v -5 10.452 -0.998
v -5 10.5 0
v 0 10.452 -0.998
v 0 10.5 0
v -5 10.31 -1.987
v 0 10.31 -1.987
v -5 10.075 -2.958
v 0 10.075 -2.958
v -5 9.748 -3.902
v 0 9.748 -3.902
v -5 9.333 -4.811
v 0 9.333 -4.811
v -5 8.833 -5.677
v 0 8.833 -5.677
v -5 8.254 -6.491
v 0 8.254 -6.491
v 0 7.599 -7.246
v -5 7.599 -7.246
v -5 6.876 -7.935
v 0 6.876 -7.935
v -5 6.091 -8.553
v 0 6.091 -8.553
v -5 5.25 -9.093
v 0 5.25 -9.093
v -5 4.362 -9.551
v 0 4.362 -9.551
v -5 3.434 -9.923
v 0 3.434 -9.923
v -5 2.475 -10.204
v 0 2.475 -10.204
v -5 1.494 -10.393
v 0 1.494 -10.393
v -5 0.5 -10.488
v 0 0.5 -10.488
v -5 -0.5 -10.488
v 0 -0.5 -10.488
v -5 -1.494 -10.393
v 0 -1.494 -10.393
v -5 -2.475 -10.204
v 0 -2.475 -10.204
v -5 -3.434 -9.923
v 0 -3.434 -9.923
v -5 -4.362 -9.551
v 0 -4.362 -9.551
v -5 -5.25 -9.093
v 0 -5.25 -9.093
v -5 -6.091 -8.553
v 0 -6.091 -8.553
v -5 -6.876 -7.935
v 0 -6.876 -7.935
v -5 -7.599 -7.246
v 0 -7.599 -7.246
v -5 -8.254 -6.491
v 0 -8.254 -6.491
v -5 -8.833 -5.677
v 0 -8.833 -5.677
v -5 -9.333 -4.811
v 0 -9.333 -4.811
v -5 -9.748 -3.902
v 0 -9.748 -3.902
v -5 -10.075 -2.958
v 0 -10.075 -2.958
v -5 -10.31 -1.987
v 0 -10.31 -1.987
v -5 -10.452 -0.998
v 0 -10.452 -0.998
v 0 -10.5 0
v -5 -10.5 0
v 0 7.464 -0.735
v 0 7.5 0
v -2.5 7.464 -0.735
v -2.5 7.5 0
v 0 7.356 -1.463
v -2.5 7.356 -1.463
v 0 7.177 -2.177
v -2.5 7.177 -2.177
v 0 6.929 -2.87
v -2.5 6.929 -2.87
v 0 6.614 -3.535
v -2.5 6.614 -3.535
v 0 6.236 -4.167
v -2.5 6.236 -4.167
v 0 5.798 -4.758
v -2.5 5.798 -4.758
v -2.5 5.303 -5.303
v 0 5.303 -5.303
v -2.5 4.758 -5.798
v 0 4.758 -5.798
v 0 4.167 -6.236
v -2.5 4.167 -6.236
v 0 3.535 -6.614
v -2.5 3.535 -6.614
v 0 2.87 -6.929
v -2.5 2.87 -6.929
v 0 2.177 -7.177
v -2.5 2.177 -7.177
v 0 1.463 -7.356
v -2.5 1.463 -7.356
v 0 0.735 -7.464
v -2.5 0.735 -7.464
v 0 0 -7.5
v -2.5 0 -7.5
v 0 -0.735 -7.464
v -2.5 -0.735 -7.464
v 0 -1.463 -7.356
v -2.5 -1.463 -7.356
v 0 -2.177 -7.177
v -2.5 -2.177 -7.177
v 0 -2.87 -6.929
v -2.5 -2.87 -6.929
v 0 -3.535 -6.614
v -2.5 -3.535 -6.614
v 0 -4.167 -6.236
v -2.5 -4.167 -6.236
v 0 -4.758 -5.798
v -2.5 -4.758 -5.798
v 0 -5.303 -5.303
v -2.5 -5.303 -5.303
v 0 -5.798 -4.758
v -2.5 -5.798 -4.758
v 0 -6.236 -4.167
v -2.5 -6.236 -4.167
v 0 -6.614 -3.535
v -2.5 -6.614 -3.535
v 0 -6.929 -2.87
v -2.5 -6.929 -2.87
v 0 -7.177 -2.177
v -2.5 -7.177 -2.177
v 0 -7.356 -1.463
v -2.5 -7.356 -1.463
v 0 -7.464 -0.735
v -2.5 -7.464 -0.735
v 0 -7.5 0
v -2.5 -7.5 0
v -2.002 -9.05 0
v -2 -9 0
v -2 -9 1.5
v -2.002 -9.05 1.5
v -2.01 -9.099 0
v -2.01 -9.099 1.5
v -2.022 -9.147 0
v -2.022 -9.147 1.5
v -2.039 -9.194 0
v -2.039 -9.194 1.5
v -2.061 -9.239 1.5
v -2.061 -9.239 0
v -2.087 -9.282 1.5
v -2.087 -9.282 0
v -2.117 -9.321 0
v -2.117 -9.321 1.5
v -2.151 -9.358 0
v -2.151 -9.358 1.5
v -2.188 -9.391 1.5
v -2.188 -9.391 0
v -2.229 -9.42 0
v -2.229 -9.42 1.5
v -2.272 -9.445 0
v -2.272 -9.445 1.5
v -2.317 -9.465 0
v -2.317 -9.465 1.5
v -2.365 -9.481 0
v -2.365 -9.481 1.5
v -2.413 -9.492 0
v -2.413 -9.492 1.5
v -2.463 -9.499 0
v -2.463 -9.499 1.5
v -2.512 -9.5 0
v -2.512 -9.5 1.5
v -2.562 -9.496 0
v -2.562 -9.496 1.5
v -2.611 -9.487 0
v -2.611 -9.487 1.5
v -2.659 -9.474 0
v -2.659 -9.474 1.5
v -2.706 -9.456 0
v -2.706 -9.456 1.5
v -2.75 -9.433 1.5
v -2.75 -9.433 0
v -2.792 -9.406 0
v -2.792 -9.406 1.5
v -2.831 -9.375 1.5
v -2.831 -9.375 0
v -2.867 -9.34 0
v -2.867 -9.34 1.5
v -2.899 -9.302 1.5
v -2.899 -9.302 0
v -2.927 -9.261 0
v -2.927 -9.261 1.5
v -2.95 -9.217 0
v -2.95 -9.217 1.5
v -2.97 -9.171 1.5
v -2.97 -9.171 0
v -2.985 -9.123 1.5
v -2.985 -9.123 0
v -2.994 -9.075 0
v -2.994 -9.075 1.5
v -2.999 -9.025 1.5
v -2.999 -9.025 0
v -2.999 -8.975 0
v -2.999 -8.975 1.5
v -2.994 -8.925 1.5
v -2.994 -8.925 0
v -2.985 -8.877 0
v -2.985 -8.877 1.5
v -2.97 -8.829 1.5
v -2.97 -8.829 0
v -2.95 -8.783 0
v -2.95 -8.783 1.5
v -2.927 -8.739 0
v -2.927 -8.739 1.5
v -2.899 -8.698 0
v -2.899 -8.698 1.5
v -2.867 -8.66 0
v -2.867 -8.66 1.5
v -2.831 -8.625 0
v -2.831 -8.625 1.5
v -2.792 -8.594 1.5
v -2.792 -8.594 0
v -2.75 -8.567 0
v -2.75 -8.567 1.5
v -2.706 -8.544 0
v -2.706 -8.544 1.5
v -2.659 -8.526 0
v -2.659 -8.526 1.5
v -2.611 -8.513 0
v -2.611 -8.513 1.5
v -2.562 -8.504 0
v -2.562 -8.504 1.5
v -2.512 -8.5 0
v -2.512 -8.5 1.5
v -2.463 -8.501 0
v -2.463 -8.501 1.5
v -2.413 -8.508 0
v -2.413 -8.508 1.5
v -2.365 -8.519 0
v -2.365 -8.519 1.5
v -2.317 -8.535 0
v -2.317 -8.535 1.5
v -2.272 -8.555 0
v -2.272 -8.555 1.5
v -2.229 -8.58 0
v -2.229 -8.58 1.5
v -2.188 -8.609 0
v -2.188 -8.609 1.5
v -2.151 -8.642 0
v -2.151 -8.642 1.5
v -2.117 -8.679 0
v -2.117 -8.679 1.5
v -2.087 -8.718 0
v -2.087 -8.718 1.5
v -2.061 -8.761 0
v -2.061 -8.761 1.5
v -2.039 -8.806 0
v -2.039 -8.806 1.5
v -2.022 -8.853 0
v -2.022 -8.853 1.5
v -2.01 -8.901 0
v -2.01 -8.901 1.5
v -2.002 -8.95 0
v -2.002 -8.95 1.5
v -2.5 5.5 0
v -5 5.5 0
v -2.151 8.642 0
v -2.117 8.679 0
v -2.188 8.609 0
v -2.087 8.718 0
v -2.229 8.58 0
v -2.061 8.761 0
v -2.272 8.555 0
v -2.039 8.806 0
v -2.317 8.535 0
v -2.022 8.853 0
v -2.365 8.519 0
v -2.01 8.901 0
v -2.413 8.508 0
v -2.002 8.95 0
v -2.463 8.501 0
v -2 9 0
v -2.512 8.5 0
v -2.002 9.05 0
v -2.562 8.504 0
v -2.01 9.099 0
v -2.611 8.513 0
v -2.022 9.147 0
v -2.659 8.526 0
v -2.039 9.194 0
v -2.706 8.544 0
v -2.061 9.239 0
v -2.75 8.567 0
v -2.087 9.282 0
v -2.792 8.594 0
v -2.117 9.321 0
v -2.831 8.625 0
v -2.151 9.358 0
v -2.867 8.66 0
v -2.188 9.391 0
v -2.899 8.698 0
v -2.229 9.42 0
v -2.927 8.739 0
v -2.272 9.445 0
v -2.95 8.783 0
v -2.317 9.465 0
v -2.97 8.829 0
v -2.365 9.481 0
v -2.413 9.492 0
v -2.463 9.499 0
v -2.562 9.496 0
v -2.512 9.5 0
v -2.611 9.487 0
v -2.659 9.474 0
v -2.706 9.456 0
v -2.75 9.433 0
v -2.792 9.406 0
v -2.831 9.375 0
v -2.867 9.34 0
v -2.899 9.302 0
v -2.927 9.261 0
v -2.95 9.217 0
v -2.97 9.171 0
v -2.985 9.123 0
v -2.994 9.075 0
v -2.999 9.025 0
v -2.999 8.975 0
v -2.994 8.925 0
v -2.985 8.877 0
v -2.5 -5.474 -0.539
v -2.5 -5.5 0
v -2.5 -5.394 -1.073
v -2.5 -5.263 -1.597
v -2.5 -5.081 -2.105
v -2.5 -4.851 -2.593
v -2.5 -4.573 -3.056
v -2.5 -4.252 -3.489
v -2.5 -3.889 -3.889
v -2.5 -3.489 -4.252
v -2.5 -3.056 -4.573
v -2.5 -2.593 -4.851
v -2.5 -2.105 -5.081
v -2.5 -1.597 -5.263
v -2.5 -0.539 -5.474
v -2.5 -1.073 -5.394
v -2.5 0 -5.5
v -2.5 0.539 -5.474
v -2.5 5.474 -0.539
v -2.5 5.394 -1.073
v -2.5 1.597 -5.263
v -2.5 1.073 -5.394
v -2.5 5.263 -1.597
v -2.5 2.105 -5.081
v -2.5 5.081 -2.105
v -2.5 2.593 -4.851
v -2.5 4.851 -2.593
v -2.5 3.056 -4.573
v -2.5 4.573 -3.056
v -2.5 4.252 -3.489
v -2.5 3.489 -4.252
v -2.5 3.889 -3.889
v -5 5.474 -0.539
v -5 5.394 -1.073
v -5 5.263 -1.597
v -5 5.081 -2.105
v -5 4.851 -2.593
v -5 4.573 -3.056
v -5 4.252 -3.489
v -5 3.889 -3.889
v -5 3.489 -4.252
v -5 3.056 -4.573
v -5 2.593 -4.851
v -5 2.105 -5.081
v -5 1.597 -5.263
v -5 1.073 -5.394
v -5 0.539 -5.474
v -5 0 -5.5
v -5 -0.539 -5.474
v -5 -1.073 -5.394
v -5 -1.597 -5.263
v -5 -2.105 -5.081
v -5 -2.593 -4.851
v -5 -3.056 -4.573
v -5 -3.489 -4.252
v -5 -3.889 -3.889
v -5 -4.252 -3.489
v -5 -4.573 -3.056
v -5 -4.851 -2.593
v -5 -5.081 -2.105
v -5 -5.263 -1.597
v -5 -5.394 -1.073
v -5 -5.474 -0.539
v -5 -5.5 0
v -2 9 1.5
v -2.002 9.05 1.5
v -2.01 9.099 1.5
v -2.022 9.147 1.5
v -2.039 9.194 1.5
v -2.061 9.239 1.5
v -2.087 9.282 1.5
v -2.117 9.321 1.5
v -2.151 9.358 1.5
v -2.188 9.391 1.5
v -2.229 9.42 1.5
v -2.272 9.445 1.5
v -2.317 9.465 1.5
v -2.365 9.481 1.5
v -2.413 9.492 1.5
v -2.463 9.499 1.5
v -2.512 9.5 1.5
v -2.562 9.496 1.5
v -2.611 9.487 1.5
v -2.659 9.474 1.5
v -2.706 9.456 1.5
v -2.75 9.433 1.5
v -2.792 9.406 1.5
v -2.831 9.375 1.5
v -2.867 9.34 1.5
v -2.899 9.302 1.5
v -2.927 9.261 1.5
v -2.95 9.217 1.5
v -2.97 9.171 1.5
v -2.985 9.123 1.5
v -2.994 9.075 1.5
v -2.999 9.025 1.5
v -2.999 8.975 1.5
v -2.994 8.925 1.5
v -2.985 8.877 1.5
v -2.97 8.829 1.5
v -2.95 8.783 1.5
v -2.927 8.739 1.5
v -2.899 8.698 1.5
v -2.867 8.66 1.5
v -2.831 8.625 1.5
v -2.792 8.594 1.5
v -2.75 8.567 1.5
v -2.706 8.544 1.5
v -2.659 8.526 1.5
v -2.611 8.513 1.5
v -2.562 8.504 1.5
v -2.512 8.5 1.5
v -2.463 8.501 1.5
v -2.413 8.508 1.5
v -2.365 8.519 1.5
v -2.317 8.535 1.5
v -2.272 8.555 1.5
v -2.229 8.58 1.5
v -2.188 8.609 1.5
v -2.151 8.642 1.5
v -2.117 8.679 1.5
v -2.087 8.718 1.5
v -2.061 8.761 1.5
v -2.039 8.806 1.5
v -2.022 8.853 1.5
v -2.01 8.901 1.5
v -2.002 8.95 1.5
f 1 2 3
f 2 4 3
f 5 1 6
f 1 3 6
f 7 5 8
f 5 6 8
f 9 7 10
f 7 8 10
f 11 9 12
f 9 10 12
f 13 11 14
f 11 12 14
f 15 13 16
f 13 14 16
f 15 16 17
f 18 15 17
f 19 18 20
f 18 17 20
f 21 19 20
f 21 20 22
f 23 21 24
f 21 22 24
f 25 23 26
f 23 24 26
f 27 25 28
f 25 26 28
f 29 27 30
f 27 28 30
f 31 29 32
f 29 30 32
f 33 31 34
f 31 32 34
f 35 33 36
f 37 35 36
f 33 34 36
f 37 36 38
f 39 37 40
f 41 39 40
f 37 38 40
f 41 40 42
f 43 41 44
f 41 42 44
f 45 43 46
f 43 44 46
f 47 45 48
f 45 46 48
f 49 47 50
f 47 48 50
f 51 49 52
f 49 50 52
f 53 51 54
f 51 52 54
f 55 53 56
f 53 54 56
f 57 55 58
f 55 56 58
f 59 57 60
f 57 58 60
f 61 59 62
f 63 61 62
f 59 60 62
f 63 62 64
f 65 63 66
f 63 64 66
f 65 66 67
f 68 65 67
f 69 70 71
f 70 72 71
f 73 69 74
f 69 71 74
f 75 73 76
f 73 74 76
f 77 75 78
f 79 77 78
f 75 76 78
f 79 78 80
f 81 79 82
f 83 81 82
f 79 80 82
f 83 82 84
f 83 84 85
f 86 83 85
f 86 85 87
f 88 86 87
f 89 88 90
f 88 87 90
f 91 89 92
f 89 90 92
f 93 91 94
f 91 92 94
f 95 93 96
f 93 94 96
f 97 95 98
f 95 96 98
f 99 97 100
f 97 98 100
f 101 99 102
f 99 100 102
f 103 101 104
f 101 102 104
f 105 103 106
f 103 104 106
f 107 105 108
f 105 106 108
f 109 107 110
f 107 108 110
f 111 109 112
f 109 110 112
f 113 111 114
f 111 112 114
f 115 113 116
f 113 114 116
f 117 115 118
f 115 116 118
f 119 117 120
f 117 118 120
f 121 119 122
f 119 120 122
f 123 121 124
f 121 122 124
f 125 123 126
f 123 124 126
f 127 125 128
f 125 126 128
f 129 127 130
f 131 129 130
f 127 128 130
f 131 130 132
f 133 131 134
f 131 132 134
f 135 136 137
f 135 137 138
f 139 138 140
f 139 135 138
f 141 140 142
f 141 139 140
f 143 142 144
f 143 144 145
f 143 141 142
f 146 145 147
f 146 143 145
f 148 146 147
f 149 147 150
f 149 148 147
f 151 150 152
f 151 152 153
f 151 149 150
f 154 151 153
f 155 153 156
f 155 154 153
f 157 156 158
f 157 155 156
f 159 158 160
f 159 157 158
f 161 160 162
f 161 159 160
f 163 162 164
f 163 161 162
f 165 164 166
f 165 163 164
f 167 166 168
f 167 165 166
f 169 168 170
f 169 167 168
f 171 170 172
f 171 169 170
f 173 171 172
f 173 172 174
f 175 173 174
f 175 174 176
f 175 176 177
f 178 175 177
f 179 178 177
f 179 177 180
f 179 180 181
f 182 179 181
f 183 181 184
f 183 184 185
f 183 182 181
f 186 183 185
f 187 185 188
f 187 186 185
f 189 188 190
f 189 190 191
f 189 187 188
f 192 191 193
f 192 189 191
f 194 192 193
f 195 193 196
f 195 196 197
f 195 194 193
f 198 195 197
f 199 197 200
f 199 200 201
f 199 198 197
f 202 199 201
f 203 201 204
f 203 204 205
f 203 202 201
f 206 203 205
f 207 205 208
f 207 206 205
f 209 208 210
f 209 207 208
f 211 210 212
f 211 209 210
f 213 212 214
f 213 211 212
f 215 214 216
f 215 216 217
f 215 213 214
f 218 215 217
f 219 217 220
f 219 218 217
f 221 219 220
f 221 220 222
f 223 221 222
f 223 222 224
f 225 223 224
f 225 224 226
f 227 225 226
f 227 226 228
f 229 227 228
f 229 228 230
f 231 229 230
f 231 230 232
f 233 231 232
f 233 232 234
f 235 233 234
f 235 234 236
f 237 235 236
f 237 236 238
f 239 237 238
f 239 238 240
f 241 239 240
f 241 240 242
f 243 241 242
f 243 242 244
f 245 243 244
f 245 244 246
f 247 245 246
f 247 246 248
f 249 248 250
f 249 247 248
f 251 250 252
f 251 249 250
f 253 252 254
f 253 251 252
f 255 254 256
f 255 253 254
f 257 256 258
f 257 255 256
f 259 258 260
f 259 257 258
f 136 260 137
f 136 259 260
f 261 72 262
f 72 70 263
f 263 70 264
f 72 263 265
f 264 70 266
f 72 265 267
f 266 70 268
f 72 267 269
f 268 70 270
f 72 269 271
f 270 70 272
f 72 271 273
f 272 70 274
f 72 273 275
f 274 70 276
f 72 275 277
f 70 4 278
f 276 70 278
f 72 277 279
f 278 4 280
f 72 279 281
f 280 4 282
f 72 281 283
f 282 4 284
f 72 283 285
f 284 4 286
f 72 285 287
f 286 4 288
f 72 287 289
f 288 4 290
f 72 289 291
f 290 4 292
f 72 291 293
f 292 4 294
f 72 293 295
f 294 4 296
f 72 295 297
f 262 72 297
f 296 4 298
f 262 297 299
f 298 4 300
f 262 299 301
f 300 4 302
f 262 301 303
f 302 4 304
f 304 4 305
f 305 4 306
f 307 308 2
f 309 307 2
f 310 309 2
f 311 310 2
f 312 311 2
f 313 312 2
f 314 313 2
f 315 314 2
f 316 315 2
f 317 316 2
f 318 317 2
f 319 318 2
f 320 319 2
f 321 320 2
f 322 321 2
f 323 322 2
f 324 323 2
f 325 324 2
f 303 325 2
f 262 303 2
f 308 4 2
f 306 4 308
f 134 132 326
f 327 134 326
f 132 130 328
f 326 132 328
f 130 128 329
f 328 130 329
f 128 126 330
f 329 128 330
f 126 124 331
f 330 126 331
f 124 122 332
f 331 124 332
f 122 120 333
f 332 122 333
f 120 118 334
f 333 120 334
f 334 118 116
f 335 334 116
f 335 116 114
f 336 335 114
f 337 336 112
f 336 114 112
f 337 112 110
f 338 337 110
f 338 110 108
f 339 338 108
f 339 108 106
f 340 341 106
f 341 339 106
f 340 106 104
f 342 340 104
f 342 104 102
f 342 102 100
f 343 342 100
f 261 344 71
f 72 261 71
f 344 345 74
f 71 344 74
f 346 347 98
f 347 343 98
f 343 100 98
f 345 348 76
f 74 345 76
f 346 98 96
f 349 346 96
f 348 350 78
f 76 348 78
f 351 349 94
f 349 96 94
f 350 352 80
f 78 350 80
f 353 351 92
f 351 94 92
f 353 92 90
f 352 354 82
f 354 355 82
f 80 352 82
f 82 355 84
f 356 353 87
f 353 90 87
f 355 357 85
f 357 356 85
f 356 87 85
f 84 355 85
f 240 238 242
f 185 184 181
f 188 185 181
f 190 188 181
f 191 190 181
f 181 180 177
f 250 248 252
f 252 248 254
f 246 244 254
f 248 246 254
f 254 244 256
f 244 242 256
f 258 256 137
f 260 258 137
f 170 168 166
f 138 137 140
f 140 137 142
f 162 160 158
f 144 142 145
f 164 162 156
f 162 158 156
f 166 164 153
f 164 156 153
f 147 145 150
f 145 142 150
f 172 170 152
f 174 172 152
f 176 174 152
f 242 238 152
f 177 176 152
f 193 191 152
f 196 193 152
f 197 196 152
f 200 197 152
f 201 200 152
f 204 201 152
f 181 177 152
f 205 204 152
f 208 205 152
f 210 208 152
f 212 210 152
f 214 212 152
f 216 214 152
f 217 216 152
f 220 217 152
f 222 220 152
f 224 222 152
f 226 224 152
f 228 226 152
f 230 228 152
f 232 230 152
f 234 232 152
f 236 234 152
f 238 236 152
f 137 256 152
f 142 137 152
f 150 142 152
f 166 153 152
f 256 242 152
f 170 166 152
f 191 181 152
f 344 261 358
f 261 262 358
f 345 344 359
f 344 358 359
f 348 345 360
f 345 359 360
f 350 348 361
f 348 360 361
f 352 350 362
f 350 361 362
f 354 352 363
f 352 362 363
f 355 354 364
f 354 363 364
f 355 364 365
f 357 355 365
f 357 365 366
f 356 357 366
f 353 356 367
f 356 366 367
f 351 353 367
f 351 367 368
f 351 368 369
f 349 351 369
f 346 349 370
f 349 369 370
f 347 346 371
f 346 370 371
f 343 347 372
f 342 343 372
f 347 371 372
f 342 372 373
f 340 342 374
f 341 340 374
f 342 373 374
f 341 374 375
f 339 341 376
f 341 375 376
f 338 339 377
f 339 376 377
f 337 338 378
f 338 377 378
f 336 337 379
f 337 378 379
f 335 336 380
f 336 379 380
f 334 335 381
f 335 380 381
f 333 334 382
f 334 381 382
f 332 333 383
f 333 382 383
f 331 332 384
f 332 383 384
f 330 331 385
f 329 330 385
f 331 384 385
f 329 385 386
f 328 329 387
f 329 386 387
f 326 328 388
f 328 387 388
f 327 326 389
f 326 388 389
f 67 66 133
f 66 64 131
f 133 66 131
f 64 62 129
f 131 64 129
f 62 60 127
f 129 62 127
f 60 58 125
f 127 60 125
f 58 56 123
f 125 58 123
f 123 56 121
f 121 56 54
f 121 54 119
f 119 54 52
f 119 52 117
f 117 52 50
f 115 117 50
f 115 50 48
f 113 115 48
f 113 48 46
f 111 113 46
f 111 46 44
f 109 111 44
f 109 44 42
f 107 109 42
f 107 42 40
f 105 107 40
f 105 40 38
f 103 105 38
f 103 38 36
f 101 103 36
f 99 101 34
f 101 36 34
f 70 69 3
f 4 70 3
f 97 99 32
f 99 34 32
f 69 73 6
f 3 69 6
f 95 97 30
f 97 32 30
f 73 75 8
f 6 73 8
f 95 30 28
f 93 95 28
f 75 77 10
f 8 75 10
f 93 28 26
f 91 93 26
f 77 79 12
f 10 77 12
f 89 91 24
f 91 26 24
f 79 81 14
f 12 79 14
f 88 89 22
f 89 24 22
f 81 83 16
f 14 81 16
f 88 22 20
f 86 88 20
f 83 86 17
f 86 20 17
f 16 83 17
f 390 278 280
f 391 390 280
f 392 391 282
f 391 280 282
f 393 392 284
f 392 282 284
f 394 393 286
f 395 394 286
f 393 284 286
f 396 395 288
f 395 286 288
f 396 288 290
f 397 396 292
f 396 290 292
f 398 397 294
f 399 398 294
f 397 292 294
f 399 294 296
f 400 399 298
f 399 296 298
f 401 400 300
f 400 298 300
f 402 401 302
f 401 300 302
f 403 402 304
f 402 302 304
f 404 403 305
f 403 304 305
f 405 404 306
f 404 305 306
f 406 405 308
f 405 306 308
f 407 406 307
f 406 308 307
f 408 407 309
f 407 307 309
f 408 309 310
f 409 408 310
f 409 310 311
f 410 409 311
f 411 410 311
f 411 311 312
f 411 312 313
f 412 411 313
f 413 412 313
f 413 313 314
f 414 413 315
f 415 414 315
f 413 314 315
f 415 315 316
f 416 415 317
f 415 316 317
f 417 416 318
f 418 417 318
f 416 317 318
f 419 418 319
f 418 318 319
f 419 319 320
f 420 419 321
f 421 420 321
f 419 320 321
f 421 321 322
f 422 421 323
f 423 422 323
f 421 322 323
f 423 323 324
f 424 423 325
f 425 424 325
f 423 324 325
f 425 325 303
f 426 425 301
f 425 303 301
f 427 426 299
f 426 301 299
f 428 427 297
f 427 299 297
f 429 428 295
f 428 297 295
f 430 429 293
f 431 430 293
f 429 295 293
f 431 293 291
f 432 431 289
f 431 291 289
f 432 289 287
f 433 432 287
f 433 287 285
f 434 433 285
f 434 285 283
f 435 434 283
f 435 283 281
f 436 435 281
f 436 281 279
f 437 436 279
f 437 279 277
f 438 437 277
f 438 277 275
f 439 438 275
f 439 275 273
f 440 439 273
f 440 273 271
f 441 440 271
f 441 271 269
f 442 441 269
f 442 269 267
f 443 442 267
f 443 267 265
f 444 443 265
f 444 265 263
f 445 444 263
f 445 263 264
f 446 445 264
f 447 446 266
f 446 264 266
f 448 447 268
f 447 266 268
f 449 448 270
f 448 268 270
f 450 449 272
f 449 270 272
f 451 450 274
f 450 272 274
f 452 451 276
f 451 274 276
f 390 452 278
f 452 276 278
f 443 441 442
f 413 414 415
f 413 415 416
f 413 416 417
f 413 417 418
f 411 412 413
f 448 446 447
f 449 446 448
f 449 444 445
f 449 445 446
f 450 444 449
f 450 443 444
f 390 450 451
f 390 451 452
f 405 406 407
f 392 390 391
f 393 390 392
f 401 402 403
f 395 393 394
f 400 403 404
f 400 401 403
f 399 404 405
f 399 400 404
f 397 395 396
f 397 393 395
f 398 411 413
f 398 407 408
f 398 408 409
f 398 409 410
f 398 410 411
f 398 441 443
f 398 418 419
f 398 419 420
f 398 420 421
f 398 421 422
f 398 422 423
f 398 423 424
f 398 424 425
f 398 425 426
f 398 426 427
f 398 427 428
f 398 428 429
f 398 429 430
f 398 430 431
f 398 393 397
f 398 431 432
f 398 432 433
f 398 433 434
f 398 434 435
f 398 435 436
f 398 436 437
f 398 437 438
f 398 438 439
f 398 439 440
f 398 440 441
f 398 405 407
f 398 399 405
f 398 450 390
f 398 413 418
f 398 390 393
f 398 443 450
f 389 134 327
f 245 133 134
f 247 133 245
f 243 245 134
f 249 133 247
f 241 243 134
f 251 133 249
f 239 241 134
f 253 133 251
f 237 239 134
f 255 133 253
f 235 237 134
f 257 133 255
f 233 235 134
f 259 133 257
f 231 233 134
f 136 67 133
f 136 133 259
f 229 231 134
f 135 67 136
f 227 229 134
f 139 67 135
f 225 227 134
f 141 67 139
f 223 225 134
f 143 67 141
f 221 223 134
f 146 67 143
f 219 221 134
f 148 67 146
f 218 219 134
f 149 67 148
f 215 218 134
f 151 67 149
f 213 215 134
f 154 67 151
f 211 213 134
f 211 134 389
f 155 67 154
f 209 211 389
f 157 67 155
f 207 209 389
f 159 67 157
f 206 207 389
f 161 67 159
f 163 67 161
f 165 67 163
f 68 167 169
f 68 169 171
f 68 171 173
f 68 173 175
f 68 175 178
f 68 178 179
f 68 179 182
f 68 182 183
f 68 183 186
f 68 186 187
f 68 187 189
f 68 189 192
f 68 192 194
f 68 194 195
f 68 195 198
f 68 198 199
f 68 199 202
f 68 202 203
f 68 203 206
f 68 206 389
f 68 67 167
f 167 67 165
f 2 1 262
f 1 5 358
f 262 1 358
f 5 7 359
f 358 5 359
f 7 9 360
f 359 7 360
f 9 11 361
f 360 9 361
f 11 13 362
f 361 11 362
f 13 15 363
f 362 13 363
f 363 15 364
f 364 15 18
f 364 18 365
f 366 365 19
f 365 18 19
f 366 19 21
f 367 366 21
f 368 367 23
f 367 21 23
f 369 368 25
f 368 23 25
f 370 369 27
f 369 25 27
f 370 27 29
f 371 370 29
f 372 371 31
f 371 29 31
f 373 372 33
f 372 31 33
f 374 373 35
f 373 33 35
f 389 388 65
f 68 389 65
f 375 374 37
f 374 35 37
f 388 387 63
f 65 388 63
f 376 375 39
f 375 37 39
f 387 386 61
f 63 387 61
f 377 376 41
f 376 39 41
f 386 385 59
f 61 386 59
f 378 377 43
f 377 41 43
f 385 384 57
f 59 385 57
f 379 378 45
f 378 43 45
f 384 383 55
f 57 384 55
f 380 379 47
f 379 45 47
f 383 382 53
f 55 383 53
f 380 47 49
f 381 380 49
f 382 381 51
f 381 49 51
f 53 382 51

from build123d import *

# Parameters (mm, degrees)
REVOLVE1_ANGLE      = 180
SKETCH2_R           = 0.5
BOSS_EXTRUDE1_DEPTH = 1.5


with BuildPart() as part:
    # Sketch1 → Revolve1 (revolve)
    with BuildSketch(Plane.XY):
        Polygon((-2.5, 5.5), (-5, 5.5), (-5, 10.5), (0, 10.5), (0, 7.5), (-2.5, 7.5), align=None)
    revolve(axis=Axis((0, 0, 0), (-1, 0, 0)), revolution_arc=REVOLVE1_ANGLE)

    # Sketch2 → Boss-Extrude1 (add)
    with BuildSketch(Plane.XY):
        with Locations((-2.5, 9)):
            Circle(SKETCH2_R)
    boss_extrude1 = extrude(amount=BOSS_EXTRUDE1_DEPTH)

    # Mirror1: Boss-Extrude1 across plane
    add(boss_extrude1.mirror(Plane.ZX))


solid = part.part
